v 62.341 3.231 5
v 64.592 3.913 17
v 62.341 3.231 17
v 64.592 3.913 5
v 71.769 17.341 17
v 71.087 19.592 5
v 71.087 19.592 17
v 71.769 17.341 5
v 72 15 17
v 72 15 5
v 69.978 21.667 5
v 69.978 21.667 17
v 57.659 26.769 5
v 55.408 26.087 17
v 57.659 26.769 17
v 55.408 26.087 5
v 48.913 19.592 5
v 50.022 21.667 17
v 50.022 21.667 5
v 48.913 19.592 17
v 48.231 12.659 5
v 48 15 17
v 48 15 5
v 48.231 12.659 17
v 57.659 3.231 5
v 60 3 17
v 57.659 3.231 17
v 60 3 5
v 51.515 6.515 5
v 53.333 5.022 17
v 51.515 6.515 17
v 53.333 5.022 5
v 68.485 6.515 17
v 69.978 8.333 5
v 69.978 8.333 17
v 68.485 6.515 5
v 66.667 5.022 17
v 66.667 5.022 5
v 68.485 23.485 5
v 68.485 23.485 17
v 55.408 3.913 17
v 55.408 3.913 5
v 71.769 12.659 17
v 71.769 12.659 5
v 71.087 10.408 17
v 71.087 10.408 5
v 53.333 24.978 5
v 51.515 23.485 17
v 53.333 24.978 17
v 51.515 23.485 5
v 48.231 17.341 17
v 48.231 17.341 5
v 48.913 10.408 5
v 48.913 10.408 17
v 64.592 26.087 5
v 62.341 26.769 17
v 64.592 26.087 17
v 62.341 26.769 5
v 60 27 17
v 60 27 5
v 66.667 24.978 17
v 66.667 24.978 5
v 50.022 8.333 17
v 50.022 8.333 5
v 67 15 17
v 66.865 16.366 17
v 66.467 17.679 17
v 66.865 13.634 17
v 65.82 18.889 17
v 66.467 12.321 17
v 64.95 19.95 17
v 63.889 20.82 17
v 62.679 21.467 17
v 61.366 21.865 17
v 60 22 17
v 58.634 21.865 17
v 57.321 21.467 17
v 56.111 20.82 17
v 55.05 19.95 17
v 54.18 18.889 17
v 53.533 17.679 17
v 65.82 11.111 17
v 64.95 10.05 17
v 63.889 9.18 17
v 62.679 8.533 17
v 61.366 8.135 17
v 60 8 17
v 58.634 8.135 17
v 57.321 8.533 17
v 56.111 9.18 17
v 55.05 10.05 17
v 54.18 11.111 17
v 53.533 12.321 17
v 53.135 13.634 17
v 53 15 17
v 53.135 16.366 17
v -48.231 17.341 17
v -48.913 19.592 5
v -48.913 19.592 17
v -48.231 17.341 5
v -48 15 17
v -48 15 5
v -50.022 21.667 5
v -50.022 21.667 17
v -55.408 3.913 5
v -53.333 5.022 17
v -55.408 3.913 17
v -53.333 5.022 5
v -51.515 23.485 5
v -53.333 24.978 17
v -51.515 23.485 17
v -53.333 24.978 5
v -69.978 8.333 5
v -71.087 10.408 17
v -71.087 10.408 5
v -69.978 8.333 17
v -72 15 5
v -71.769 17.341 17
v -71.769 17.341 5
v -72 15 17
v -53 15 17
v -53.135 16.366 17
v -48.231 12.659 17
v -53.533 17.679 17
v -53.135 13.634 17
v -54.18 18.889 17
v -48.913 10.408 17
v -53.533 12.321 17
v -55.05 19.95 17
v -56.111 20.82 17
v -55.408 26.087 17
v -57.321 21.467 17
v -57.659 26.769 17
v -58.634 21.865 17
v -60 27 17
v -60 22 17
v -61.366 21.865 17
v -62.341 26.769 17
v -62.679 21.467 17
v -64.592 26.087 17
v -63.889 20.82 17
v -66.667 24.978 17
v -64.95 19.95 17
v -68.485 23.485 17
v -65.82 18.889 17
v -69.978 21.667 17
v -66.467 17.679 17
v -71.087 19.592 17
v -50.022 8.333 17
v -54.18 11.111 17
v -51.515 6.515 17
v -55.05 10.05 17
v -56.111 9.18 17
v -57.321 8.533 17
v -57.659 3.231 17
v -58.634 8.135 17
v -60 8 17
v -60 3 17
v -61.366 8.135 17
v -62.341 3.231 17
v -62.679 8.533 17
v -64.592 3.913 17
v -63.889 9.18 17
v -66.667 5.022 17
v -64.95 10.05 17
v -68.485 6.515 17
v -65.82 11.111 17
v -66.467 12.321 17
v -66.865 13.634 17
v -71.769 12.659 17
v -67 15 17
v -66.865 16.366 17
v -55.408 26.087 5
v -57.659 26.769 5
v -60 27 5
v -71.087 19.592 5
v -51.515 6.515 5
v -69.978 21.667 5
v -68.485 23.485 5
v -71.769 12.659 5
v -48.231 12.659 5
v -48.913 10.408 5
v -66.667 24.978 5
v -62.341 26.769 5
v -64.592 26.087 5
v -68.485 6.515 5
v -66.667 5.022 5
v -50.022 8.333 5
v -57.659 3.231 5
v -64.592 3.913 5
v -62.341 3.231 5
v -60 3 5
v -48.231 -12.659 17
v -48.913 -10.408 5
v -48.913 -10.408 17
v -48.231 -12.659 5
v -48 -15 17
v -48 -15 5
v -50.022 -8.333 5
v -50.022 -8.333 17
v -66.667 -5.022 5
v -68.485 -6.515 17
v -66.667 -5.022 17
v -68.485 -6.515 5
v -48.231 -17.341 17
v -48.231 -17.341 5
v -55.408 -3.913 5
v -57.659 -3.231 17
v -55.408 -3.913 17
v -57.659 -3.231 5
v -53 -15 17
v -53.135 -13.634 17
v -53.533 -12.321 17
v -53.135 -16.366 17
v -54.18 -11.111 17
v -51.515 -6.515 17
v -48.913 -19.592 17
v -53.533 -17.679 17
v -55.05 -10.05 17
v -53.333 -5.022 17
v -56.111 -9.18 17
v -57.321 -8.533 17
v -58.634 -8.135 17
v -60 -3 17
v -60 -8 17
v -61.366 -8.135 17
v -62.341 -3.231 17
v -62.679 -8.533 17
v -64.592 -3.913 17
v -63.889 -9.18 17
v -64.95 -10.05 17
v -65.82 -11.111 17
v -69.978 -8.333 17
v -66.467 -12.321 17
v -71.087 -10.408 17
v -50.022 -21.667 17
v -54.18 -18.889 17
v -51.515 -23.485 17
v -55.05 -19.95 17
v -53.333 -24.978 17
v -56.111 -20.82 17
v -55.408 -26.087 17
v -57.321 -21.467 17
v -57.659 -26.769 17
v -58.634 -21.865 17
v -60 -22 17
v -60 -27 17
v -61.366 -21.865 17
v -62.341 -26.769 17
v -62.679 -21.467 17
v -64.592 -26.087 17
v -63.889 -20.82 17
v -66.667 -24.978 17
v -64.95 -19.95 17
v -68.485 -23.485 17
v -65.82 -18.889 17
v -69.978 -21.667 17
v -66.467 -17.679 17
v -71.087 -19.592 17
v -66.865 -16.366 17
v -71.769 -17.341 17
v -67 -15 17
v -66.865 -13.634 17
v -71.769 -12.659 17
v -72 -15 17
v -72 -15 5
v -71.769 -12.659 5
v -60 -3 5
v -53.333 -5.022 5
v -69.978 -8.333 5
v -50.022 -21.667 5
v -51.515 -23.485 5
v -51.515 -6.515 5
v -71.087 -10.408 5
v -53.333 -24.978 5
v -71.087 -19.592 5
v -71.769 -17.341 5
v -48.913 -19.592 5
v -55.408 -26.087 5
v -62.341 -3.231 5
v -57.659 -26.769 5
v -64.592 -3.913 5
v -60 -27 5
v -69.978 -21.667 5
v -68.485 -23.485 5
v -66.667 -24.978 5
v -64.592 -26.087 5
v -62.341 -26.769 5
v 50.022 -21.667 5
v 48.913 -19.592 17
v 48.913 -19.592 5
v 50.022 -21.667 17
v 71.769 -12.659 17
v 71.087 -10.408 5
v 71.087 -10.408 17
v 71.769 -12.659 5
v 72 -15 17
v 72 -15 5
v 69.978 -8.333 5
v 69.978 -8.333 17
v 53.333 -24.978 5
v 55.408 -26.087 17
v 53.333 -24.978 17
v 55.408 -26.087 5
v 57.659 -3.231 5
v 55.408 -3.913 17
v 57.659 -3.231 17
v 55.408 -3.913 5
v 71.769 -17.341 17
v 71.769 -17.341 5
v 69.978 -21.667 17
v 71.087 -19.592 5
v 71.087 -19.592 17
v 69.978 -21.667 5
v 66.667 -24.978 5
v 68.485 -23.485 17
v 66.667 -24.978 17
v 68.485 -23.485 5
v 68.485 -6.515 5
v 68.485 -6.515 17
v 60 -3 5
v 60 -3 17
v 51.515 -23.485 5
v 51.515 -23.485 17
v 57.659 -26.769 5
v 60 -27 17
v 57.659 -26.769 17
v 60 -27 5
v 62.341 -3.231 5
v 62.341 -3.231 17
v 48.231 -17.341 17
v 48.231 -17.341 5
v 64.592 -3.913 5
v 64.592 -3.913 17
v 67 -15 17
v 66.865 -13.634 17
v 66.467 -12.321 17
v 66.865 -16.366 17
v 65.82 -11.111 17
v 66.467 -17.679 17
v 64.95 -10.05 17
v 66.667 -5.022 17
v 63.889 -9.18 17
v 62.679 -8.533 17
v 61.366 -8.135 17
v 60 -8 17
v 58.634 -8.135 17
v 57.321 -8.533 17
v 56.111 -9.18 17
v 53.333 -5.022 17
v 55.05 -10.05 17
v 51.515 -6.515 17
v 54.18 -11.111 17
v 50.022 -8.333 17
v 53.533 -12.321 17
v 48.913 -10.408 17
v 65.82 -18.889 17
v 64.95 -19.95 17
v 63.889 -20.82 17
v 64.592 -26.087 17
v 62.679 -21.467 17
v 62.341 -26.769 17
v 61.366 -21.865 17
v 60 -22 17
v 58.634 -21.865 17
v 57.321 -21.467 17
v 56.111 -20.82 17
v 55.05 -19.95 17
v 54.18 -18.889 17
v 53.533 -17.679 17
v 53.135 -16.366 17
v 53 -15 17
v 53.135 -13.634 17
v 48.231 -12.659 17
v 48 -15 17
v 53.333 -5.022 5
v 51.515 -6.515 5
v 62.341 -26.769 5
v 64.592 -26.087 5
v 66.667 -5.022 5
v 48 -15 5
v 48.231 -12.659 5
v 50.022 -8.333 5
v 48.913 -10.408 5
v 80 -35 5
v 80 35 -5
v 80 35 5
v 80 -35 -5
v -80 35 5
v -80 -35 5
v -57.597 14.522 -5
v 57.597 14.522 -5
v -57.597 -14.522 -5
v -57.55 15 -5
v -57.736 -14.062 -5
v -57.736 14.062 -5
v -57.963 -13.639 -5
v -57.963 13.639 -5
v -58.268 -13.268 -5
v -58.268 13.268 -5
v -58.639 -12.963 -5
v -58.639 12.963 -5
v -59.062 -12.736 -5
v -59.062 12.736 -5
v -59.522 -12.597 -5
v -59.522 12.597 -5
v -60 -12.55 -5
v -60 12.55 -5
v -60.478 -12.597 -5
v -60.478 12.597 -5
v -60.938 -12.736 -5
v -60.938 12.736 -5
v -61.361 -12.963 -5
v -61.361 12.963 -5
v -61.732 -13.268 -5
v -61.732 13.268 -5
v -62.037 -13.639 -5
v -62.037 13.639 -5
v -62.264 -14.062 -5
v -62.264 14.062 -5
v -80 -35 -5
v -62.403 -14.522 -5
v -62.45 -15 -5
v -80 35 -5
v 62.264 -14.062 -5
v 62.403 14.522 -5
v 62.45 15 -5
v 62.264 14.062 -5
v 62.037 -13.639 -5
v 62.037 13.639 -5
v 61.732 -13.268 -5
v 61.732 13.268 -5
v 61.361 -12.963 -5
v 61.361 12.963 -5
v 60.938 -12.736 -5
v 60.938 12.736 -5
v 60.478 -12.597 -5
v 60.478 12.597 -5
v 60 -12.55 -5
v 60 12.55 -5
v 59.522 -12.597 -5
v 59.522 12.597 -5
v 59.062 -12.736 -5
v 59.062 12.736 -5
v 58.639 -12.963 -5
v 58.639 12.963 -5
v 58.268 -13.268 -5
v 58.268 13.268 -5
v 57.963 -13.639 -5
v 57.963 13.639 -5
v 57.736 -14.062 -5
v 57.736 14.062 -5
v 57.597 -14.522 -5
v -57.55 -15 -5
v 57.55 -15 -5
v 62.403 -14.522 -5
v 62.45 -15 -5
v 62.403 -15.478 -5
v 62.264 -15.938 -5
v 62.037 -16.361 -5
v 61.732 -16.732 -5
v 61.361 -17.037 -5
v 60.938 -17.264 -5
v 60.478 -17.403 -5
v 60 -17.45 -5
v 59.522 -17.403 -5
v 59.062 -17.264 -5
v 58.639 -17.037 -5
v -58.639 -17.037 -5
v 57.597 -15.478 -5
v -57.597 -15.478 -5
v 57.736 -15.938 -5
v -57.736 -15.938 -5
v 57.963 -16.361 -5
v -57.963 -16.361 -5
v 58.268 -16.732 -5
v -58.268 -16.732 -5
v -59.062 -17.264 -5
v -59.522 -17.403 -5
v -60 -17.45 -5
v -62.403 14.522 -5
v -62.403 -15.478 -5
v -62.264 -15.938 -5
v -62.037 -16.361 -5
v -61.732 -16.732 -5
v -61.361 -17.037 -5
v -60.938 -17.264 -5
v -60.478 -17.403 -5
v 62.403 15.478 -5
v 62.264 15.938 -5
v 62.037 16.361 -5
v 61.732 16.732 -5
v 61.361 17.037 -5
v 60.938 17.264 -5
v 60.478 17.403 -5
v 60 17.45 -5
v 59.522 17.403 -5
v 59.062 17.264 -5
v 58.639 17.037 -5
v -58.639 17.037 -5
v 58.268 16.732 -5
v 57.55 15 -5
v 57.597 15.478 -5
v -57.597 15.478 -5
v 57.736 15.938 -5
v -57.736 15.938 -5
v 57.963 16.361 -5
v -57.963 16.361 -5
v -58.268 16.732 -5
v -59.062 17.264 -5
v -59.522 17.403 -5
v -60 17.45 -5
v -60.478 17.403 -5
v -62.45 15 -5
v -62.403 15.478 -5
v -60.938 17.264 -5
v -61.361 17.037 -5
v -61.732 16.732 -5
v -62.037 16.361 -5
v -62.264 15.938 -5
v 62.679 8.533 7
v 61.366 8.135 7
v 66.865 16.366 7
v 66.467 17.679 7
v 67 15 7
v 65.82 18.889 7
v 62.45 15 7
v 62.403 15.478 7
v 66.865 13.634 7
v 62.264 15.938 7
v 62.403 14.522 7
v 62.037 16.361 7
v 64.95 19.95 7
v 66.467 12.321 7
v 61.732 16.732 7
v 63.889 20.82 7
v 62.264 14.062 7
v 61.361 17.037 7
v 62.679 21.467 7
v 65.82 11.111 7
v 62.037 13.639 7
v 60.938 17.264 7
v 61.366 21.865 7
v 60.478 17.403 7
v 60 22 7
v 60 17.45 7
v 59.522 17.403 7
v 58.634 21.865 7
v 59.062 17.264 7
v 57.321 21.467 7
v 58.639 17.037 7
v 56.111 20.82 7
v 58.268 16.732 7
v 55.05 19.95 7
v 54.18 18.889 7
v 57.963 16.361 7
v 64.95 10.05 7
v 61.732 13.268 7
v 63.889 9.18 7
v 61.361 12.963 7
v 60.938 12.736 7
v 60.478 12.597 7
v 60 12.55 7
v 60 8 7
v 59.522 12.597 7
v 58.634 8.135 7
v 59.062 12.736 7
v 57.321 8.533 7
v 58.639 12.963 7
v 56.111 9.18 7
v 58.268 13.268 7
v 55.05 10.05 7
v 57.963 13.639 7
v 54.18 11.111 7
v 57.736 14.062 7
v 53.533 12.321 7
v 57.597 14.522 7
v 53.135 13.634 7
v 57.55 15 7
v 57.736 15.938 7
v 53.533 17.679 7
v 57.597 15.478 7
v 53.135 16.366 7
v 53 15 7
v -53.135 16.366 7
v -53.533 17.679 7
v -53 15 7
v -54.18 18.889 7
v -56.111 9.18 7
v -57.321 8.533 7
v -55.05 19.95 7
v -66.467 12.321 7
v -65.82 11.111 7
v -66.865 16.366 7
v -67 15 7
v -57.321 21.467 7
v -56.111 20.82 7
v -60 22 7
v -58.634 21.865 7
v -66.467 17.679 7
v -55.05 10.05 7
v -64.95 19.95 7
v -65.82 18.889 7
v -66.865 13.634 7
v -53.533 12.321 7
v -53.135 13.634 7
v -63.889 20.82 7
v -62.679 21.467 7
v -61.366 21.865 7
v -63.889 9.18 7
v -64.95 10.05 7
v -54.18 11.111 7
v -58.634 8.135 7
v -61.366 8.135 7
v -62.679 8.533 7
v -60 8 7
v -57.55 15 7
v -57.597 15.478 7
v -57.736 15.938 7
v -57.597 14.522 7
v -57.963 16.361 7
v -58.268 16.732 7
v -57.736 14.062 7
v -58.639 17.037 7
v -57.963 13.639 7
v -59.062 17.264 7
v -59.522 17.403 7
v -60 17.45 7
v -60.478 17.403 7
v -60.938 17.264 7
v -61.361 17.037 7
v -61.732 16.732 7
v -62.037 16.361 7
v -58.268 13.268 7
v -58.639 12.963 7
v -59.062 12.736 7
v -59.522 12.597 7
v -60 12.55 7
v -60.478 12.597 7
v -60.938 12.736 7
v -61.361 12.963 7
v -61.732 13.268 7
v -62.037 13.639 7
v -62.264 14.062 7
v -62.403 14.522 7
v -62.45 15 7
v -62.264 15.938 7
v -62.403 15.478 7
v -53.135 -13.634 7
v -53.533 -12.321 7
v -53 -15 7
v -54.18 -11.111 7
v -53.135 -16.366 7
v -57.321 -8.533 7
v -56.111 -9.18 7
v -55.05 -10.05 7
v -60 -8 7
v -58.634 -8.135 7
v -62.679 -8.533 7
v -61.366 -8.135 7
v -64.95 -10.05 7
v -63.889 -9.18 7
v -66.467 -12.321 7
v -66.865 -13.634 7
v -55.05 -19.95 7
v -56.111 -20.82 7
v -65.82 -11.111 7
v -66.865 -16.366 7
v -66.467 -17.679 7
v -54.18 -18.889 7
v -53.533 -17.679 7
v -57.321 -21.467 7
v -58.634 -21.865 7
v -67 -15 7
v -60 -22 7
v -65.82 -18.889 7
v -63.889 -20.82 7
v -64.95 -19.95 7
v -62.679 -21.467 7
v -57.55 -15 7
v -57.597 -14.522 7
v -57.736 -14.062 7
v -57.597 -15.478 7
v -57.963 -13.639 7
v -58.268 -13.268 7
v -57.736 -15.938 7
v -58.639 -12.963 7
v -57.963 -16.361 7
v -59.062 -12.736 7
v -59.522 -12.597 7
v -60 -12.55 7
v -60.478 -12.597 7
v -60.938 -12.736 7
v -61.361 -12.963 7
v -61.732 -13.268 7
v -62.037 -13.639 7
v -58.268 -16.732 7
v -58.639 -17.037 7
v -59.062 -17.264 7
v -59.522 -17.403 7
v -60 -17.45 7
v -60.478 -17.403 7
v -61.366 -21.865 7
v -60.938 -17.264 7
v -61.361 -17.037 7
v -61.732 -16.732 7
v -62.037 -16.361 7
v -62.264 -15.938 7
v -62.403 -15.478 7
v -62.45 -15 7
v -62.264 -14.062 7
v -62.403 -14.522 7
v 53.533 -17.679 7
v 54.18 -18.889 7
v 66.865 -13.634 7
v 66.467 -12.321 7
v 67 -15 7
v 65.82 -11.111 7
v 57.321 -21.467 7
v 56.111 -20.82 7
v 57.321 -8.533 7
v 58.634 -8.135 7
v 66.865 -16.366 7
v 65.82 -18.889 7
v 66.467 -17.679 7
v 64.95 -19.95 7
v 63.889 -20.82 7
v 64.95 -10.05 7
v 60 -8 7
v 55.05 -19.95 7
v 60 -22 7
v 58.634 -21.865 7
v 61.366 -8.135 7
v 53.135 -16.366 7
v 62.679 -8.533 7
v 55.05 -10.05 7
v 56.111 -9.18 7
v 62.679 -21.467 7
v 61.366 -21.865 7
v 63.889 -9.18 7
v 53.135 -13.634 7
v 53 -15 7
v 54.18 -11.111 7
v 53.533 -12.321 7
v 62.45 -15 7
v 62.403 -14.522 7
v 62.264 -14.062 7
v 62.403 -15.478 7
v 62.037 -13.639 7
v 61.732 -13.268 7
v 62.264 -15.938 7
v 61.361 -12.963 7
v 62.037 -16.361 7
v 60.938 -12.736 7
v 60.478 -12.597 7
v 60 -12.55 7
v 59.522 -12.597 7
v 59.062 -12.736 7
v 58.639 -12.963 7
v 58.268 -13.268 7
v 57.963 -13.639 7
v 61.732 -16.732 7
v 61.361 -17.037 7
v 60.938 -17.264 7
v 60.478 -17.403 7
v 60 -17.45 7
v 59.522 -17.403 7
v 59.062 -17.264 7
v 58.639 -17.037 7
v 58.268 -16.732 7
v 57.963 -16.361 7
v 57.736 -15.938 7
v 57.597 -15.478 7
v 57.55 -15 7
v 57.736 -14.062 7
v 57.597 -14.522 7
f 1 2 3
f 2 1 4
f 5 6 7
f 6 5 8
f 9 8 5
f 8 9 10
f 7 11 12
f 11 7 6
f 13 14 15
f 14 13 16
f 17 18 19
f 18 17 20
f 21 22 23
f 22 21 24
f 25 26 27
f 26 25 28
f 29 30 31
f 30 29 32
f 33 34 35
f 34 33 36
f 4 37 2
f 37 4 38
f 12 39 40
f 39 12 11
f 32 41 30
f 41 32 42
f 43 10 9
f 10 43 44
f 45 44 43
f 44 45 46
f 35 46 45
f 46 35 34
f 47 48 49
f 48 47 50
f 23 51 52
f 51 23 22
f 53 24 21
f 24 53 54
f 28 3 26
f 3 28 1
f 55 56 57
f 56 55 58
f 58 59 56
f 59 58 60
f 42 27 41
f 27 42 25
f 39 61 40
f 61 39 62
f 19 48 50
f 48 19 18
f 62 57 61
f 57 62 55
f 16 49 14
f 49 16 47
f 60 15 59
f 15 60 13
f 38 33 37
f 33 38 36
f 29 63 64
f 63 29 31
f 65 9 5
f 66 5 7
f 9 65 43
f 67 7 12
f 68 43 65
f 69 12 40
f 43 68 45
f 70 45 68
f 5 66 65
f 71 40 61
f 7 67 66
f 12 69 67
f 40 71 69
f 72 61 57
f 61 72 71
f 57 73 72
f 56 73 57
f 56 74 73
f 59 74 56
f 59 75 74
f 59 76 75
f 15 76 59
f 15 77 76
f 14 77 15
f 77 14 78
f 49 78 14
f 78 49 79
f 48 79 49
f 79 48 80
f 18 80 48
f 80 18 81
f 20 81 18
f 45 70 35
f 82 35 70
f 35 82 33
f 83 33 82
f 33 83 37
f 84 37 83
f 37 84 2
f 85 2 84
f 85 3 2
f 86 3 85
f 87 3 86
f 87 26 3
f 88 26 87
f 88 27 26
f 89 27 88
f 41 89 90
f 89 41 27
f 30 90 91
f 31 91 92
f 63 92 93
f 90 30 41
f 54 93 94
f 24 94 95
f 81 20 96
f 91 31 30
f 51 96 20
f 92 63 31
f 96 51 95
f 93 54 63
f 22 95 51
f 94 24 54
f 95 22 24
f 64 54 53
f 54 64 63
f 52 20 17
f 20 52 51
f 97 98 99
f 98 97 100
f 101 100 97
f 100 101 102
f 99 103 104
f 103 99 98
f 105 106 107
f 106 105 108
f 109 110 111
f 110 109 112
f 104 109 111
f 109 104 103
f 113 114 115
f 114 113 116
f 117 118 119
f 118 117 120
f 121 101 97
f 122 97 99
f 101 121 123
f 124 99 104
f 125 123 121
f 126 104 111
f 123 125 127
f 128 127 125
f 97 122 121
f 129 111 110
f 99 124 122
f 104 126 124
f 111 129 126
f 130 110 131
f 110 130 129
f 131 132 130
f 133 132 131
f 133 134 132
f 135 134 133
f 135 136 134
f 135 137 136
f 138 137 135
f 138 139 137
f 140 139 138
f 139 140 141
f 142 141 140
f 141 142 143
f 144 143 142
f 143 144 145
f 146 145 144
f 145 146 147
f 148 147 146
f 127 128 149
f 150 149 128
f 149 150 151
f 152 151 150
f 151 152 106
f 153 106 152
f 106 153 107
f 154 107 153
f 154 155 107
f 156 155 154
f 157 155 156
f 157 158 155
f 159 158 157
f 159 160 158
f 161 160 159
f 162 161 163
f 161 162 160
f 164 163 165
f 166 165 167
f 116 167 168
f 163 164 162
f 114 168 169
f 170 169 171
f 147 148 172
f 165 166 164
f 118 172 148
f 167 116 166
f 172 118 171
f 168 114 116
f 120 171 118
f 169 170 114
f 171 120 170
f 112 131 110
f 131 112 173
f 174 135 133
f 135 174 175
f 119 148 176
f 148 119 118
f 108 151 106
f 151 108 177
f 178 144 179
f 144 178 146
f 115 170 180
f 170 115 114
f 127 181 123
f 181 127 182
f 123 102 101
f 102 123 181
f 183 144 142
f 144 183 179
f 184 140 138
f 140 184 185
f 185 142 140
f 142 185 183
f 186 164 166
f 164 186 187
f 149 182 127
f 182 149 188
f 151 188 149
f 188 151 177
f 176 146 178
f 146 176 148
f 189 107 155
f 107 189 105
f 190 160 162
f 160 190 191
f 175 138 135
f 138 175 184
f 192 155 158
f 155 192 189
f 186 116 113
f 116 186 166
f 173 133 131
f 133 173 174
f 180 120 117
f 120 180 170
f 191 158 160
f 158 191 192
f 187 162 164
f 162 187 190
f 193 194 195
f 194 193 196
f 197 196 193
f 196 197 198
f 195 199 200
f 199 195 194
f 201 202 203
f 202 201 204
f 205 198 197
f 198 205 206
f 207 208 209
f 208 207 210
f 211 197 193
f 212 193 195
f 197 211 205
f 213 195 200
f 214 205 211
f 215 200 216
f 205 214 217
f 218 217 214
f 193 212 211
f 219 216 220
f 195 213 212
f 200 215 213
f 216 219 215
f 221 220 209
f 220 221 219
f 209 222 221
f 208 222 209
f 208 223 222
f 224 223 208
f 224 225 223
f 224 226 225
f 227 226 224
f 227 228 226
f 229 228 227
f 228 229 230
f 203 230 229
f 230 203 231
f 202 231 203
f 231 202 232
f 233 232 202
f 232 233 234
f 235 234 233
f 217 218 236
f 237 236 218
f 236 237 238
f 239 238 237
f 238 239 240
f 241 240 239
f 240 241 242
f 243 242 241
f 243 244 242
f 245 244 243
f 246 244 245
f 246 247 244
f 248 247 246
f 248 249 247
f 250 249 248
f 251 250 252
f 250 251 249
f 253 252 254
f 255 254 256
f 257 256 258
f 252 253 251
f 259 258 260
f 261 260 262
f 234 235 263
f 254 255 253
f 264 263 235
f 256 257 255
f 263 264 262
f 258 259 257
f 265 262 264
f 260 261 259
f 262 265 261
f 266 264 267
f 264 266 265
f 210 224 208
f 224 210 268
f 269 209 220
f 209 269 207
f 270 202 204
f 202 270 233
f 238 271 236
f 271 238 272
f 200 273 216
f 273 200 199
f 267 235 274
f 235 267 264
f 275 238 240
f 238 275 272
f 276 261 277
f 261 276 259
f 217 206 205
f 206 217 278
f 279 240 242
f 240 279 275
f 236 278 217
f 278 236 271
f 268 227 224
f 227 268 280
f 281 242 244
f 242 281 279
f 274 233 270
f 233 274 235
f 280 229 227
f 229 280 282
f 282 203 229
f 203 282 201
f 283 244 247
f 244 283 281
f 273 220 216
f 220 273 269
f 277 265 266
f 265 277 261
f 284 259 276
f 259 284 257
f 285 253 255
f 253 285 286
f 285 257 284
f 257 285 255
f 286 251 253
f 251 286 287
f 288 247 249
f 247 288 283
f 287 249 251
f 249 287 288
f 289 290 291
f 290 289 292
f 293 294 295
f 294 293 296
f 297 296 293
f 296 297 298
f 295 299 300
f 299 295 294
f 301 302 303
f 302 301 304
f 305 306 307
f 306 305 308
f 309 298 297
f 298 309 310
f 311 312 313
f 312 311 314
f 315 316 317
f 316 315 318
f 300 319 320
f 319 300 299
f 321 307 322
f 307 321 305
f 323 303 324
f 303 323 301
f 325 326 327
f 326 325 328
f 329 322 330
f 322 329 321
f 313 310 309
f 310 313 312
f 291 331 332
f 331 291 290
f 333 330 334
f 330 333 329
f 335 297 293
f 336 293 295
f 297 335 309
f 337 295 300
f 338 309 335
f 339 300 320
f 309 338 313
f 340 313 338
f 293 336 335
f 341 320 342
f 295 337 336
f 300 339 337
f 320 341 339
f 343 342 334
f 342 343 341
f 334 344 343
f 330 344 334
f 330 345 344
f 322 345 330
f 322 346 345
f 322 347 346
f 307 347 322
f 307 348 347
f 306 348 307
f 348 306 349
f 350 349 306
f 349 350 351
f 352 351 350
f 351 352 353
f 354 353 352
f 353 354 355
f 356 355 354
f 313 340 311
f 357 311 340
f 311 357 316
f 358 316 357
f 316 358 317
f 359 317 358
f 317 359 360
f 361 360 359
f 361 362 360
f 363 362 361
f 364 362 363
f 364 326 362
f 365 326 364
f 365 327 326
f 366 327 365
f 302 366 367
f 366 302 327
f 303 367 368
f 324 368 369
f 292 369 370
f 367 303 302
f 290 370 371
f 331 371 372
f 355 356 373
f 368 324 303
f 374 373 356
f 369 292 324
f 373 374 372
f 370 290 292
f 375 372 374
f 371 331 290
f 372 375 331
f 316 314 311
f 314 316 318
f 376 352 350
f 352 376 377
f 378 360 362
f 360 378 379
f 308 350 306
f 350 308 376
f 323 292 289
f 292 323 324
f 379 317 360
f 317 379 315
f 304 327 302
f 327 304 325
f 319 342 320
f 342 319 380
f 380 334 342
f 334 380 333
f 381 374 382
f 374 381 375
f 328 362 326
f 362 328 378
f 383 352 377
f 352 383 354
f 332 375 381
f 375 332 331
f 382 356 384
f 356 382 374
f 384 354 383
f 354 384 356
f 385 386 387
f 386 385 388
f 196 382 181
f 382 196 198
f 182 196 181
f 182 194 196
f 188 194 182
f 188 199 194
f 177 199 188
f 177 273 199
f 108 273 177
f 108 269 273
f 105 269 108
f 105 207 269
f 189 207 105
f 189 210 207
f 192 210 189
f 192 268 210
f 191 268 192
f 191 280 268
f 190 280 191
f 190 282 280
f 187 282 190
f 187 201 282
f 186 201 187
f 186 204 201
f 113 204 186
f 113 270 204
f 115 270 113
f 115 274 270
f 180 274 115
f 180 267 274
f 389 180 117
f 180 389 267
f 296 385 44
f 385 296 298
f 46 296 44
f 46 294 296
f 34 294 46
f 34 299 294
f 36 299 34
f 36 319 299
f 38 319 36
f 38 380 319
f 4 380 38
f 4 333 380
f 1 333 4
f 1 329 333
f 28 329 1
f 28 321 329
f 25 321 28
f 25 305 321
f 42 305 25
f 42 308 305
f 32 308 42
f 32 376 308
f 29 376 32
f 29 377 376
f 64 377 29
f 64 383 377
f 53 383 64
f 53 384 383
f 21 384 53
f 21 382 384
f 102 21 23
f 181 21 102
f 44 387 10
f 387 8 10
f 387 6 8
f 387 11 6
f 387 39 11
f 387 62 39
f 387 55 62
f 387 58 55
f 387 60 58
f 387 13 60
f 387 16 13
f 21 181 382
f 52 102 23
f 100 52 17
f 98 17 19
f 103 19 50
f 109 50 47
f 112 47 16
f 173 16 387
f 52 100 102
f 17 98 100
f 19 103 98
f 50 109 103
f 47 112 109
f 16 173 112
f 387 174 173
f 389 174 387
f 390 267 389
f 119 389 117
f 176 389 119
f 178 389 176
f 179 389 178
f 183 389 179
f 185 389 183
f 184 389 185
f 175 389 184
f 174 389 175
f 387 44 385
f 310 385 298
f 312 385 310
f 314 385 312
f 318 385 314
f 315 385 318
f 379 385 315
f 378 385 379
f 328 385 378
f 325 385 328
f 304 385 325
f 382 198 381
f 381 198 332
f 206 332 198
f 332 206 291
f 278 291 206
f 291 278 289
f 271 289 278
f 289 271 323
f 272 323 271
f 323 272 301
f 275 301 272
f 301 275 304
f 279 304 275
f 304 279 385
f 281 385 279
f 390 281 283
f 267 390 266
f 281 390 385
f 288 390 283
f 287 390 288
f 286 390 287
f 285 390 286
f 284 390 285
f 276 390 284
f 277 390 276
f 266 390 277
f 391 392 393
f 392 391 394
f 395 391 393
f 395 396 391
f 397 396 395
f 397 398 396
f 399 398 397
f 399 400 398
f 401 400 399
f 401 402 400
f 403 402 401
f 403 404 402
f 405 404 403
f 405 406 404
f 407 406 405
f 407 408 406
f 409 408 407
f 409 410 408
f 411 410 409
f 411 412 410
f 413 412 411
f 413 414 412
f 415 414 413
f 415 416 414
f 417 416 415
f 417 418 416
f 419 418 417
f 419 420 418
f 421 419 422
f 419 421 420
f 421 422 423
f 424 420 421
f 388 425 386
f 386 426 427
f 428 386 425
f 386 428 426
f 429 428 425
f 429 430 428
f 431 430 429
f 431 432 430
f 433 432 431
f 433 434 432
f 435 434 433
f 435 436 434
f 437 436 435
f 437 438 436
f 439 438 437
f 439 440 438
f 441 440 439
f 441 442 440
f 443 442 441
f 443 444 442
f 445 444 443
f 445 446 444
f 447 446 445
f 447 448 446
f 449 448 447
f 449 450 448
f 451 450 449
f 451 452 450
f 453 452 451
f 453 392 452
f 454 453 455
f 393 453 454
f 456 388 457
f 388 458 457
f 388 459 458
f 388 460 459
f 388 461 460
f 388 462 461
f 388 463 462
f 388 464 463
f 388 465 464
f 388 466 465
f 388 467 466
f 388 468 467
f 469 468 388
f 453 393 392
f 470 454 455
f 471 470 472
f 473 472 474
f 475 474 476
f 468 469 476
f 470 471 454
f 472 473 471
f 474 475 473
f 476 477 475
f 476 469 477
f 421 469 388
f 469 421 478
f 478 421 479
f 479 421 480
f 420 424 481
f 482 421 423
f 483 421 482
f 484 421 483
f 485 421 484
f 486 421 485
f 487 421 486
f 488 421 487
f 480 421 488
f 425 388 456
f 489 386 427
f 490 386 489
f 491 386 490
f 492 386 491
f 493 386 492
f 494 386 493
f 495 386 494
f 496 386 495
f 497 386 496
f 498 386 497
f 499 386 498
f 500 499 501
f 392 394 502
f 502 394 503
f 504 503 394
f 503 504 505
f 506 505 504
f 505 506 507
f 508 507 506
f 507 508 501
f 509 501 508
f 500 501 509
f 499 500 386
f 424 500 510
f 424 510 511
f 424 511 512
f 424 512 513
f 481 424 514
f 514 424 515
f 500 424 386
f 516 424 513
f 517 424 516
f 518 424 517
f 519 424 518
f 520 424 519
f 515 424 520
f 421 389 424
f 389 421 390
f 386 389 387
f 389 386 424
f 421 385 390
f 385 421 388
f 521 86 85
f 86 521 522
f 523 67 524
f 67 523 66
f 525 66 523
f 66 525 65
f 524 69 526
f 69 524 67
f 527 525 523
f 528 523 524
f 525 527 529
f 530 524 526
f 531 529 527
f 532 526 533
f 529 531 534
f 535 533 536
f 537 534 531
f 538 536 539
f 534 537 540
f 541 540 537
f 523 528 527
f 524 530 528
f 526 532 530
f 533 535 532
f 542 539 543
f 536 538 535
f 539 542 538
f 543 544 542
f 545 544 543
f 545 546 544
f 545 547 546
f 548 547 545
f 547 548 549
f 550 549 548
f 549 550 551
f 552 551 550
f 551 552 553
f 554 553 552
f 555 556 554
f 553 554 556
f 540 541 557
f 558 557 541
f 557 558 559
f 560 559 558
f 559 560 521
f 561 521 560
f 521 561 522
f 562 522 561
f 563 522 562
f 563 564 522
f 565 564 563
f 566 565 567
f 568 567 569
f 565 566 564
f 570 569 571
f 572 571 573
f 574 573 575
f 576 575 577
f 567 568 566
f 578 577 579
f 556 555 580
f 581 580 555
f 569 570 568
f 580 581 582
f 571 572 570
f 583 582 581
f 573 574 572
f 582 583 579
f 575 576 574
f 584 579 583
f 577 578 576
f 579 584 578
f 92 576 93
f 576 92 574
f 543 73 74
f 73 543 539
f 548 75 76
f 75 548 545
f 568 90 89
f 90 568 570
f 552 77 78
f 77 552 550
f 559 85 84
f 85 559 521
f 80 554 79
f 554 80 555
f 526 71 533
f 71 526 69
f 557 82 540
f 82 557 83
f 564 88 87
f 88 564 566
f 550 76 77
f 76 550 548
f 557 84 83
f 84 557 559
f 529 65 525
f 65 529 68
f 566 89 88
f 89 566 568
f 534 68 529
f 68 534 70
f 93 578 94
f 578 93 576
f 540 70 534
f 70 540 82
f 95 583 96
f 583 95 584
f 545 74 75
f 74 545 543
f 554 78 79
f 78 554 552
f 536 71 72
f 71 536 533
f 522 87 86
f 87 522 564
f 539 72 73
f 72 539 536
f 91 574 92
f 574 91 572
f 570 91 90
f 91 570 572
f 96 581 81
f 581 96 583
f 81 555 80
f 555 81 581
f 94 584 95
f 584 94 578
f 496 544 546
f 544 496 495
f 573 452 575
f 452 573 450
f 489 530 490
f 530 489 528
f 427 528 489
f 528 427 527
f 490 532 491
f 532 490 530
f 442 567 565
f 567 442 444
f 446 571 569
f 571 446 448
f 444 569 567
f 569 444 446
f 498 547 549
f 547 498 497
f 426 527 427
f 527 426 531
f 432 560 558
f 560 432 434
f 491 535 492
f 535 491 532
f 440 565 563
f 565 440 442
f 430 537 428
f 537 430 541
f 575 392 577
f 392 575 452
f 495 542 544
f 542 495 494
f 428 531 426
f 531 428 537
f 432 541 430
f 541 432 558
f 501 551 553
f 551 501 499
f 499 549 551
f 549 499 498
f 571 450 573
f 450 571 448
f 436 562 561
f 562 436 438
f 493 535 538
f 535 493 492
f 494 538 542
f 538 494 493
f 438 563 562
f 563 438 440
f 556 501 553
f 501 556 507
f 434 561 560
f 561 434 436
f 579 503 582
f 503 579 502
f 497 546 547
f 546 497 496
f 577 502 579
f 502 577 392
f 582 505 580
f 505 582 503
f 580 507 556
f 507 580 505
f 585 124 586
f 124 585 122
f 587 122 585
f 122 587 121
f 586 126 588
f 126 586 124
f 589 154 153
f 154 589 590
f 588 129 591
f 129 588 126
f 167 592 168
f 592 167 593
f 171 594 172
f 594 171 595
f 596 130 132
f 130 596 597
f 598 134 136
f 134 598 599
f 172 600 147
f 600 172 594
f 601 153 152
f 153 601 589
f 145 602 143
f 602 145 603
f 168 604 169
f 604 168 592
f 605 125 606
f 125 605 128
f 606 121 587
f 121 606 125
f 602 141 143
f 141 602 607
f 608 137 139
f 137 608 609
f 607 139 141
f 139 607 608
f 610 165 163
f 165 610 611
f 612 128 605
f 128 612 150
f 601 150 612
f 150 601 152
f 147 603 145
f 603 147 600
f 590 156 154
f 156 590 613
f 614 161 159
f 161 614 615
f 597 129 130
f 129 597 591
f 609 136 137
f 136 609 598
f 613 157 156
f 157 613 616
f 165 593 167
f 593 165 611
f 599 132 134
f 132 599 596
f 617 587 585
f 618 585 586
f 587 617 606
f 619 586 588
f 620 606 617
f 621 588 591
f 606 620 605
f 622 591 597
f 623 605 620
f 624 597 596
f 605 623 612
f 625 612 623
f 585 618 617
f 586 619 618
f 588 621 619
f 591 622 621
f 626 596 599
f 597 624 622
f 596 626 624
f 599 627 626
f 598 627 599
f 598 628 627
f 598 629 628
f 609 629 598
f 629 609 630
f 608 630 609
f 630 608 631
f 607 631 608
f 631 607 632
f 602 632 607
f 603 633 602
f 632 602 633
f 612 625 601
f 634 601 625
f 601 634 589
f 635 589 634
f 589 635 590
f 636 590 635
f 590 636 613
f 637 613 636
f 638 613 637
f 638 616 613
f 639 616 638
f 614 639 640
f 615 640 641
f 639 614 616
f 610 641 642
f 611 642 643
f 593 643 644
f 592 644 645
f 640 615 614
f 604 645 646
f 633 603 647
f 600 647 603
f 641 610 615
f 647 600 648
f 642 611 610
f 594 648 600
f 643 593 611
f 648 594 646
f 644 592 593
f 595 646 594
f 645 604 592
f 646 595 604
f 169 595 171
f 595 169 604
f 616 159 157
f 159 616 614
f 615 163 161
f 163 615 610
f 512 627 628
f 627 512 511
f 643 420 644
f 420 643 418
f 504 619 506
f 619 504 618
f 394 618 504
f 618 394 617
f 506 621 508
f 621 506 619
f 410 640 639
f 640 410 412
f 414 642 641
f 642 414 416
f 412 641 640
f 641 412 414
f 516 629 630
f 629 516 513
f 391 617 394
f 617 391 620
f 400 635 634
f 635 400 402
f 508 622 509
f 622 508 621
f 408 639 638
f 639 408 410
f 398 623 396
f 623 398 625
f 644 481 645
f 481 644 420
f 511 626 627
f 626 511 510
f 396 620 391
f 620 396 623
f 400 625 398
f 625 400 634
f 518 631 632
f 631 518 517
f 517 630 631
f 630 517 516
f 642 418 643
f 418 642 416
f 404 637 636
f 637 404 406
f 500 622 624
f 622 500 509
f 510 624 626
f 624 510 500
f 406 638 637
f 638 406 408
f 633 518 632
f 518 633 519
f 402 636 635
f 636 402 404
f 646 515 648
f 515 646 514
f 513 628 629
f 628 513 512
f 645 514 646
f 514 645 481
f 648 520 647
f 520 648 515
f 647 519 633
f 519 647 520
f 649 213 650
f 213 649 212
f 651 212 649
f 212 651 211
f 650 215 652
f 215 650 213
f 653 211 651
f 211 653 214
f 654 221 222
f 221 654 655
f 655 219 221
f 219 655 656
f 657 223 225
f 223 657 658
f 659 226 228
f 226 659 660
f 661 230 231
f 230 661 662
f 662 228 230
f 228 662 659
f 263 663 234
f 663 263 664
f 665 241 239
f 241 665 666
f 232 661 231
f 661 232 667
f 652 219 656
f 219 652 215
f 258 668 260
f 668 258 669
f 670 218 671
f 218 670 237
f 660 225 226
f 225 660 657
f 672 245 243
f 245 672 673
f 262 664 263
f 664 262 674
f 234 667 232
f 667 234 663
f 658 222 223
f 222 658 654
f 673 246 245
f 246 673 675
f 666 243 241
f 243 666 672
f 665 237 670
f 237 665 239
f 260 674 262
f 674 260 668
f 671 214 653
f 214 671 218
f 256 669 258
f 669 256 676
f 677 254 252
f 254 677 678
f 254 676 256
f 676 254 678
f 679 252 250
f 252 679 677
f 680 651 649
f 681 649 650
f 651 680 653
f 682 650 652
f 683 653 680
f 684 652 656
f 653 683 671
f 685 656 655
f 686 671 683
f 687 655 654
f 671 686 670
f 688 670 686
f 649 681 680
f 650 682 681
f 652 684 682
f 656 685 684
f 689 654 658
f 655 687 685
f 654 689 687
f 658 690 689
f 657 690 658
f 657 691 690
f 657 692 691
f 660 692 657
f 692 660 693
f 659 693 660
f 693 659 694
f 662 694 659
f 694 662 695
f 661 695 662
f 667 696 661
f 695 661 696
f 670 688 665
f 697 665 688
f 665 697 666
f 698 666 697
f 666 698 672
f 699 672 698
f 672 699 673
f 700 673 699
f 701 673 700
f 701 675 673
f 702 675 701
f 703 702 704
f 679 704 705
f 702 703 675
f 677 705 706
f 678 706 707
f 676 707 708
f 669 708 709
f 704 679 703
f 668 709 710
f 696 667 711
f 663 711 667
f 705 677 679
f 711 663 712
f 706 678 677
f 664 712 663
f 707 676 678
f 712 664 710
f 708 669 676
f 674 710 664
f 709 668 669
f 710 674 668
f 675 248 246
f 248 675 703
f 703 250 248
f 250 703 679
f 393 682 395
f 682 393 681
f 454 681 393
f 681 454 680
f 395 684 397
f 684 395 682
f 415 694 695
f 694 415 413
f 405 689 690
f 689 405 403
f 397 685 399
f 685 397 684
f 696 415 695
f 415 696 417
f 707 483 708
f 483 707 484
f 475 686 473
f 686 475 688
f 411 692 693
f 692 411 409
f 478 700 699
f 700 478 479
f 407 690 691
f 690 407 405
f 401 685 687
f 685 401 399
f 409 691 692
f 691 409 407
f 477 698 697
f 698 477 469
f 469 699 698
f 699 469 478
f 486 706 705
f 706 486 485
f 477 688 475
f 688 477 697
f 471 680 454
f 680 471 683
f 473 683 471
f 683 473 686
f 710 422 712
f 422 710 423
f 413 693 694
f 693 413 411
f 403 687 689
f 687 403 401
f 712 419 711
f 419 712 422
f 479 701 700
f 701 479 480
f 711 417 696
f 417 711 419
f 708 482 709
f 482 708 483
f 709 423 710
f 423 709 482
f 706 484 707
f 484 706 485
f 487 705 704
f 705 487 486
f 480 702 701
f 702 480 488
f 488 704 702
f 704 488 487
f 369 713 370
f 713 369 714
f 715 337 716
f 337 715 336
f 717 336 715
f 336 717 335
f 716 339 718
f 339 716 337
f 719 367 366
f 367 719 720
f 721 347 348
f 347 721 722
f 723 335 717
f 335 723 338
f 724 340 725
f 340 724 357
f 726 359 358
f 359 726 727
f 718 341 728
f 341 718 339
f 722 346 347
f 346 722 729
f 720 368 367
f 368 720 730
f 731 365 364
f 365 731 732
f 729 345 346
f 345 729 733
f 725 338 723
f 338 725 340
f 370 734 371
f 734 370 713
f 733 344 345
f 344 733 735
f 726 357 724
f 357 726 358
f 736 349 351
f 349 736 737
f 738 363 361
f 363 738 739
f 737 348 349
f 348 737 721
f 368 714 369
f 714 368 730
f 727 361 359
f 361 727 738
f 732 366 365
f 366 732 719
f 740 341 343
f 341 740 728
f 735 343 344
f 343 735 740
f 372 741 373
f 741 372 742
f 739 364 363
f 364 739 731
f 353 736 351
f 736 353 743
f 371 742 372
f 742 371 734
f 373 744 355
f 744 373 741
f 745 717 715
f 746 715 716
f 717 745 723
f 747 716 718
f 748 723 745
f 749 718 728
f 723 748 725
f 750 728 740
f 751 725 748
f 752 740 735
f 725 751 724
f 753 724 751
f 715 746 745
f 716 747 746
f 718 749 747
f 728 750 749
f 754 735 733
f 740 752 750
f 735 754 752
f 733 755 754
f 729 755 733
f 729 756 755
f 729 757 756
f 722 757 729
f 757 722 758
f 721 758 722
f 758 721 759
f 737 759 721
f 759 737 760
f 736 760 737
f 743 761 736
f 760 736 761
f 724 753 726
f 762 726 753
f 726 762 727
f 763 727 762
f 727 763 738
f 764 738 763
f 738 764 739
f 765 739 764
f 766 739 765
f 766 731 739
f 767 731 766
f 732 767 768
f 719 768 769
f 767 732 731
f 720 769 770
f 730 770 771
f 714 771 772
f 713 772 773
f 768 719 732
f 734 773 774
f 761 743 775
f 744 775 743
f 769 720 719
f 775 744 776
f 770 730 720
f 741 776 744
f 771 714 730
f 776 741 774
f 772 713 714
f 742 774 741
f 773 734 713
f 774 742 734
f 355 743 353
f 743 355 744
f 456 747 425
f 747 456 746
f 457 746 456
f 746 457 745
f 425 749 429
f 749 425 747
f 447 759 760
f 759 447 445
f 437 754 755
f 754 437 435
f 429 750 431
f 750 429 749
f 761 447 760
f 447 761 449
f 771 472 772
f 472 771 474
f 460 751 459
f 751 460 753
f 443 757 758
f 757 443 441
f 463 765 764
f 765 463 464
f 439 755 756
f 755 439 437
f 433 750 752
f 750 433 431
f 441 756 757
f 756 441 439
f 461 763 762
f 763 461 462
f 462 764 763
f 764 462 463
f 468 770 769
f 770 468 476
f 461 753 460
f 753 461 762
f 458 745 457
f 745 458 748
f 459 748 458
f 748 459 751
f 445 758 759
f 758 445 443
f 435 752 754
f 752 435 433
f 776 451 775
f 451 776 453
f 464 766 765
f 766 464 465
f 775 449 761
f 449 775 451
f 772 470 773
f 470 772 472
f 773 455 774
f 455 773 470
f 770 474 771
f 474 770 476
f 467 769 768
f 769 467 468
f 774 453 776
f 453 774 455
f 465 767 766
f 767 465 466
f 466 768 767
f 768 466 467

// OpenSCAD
$fn = 32;

// ----------------------------------------------------------------------
// Socket pad plate
// bosses with counterbored sockets for the screws
// ----------------------------------------------------------------------

// --- parameters (mm) ---
base_t = 10;            // base plate thickness
boss_h = 12;            // boss height above the base plate
boss_d = 24;            // boss diameter
socket_d = 14;          // socket diameter
socket_depth = 10;      // socket depth from the boss face
bolt_d = 4.9;           // screw clearance hole through the socket floor
plate = [160, 70, 10];  // overall size (x, y, z)
edge = 20;              // boss centre offset from the plate edge
pads = 4;               // boss count, one per corner

// --- derived feature positions (mm) ---
height = base_t + boss_h;        // = 22   overall height of the part
corner_x = plate[0] / 2 - edge;  // = 60   boss centre X
corner_y = plate[1] / 2 - edge;  // = 15   boss centre Y
feature_centers = [
  [corner_x, corner_y],
  [-corner_x, corner_y],
  [-corner_x, -corner_y],
  [corner_x, -corner_y]
];   // boss centres: sockets, holes and the pads themselves are placed from here

// base plate, bosses on feature_centers, socket + through hole in each
difference() {
  union() {
    cube(plate, center = true);
    for (centre = feature_centers)
      translate([centre[0], centre[1], plate[2] / 2 - 1])
        cylinder(d = boss_d, h = boss_h + 1);
  }
  for (centre = feature_centers) {
    translate([centre[0], centre[1], plate[2] / 2 + boss_h - socket_depth])
      cylinder(d = socket_d, h = socket_depth + 1);
    translate([centre[0], centre[1], -height])
      cylinder(d = bolt_d, h = 2 * height + 2);  // through the socket floor
  }
}
